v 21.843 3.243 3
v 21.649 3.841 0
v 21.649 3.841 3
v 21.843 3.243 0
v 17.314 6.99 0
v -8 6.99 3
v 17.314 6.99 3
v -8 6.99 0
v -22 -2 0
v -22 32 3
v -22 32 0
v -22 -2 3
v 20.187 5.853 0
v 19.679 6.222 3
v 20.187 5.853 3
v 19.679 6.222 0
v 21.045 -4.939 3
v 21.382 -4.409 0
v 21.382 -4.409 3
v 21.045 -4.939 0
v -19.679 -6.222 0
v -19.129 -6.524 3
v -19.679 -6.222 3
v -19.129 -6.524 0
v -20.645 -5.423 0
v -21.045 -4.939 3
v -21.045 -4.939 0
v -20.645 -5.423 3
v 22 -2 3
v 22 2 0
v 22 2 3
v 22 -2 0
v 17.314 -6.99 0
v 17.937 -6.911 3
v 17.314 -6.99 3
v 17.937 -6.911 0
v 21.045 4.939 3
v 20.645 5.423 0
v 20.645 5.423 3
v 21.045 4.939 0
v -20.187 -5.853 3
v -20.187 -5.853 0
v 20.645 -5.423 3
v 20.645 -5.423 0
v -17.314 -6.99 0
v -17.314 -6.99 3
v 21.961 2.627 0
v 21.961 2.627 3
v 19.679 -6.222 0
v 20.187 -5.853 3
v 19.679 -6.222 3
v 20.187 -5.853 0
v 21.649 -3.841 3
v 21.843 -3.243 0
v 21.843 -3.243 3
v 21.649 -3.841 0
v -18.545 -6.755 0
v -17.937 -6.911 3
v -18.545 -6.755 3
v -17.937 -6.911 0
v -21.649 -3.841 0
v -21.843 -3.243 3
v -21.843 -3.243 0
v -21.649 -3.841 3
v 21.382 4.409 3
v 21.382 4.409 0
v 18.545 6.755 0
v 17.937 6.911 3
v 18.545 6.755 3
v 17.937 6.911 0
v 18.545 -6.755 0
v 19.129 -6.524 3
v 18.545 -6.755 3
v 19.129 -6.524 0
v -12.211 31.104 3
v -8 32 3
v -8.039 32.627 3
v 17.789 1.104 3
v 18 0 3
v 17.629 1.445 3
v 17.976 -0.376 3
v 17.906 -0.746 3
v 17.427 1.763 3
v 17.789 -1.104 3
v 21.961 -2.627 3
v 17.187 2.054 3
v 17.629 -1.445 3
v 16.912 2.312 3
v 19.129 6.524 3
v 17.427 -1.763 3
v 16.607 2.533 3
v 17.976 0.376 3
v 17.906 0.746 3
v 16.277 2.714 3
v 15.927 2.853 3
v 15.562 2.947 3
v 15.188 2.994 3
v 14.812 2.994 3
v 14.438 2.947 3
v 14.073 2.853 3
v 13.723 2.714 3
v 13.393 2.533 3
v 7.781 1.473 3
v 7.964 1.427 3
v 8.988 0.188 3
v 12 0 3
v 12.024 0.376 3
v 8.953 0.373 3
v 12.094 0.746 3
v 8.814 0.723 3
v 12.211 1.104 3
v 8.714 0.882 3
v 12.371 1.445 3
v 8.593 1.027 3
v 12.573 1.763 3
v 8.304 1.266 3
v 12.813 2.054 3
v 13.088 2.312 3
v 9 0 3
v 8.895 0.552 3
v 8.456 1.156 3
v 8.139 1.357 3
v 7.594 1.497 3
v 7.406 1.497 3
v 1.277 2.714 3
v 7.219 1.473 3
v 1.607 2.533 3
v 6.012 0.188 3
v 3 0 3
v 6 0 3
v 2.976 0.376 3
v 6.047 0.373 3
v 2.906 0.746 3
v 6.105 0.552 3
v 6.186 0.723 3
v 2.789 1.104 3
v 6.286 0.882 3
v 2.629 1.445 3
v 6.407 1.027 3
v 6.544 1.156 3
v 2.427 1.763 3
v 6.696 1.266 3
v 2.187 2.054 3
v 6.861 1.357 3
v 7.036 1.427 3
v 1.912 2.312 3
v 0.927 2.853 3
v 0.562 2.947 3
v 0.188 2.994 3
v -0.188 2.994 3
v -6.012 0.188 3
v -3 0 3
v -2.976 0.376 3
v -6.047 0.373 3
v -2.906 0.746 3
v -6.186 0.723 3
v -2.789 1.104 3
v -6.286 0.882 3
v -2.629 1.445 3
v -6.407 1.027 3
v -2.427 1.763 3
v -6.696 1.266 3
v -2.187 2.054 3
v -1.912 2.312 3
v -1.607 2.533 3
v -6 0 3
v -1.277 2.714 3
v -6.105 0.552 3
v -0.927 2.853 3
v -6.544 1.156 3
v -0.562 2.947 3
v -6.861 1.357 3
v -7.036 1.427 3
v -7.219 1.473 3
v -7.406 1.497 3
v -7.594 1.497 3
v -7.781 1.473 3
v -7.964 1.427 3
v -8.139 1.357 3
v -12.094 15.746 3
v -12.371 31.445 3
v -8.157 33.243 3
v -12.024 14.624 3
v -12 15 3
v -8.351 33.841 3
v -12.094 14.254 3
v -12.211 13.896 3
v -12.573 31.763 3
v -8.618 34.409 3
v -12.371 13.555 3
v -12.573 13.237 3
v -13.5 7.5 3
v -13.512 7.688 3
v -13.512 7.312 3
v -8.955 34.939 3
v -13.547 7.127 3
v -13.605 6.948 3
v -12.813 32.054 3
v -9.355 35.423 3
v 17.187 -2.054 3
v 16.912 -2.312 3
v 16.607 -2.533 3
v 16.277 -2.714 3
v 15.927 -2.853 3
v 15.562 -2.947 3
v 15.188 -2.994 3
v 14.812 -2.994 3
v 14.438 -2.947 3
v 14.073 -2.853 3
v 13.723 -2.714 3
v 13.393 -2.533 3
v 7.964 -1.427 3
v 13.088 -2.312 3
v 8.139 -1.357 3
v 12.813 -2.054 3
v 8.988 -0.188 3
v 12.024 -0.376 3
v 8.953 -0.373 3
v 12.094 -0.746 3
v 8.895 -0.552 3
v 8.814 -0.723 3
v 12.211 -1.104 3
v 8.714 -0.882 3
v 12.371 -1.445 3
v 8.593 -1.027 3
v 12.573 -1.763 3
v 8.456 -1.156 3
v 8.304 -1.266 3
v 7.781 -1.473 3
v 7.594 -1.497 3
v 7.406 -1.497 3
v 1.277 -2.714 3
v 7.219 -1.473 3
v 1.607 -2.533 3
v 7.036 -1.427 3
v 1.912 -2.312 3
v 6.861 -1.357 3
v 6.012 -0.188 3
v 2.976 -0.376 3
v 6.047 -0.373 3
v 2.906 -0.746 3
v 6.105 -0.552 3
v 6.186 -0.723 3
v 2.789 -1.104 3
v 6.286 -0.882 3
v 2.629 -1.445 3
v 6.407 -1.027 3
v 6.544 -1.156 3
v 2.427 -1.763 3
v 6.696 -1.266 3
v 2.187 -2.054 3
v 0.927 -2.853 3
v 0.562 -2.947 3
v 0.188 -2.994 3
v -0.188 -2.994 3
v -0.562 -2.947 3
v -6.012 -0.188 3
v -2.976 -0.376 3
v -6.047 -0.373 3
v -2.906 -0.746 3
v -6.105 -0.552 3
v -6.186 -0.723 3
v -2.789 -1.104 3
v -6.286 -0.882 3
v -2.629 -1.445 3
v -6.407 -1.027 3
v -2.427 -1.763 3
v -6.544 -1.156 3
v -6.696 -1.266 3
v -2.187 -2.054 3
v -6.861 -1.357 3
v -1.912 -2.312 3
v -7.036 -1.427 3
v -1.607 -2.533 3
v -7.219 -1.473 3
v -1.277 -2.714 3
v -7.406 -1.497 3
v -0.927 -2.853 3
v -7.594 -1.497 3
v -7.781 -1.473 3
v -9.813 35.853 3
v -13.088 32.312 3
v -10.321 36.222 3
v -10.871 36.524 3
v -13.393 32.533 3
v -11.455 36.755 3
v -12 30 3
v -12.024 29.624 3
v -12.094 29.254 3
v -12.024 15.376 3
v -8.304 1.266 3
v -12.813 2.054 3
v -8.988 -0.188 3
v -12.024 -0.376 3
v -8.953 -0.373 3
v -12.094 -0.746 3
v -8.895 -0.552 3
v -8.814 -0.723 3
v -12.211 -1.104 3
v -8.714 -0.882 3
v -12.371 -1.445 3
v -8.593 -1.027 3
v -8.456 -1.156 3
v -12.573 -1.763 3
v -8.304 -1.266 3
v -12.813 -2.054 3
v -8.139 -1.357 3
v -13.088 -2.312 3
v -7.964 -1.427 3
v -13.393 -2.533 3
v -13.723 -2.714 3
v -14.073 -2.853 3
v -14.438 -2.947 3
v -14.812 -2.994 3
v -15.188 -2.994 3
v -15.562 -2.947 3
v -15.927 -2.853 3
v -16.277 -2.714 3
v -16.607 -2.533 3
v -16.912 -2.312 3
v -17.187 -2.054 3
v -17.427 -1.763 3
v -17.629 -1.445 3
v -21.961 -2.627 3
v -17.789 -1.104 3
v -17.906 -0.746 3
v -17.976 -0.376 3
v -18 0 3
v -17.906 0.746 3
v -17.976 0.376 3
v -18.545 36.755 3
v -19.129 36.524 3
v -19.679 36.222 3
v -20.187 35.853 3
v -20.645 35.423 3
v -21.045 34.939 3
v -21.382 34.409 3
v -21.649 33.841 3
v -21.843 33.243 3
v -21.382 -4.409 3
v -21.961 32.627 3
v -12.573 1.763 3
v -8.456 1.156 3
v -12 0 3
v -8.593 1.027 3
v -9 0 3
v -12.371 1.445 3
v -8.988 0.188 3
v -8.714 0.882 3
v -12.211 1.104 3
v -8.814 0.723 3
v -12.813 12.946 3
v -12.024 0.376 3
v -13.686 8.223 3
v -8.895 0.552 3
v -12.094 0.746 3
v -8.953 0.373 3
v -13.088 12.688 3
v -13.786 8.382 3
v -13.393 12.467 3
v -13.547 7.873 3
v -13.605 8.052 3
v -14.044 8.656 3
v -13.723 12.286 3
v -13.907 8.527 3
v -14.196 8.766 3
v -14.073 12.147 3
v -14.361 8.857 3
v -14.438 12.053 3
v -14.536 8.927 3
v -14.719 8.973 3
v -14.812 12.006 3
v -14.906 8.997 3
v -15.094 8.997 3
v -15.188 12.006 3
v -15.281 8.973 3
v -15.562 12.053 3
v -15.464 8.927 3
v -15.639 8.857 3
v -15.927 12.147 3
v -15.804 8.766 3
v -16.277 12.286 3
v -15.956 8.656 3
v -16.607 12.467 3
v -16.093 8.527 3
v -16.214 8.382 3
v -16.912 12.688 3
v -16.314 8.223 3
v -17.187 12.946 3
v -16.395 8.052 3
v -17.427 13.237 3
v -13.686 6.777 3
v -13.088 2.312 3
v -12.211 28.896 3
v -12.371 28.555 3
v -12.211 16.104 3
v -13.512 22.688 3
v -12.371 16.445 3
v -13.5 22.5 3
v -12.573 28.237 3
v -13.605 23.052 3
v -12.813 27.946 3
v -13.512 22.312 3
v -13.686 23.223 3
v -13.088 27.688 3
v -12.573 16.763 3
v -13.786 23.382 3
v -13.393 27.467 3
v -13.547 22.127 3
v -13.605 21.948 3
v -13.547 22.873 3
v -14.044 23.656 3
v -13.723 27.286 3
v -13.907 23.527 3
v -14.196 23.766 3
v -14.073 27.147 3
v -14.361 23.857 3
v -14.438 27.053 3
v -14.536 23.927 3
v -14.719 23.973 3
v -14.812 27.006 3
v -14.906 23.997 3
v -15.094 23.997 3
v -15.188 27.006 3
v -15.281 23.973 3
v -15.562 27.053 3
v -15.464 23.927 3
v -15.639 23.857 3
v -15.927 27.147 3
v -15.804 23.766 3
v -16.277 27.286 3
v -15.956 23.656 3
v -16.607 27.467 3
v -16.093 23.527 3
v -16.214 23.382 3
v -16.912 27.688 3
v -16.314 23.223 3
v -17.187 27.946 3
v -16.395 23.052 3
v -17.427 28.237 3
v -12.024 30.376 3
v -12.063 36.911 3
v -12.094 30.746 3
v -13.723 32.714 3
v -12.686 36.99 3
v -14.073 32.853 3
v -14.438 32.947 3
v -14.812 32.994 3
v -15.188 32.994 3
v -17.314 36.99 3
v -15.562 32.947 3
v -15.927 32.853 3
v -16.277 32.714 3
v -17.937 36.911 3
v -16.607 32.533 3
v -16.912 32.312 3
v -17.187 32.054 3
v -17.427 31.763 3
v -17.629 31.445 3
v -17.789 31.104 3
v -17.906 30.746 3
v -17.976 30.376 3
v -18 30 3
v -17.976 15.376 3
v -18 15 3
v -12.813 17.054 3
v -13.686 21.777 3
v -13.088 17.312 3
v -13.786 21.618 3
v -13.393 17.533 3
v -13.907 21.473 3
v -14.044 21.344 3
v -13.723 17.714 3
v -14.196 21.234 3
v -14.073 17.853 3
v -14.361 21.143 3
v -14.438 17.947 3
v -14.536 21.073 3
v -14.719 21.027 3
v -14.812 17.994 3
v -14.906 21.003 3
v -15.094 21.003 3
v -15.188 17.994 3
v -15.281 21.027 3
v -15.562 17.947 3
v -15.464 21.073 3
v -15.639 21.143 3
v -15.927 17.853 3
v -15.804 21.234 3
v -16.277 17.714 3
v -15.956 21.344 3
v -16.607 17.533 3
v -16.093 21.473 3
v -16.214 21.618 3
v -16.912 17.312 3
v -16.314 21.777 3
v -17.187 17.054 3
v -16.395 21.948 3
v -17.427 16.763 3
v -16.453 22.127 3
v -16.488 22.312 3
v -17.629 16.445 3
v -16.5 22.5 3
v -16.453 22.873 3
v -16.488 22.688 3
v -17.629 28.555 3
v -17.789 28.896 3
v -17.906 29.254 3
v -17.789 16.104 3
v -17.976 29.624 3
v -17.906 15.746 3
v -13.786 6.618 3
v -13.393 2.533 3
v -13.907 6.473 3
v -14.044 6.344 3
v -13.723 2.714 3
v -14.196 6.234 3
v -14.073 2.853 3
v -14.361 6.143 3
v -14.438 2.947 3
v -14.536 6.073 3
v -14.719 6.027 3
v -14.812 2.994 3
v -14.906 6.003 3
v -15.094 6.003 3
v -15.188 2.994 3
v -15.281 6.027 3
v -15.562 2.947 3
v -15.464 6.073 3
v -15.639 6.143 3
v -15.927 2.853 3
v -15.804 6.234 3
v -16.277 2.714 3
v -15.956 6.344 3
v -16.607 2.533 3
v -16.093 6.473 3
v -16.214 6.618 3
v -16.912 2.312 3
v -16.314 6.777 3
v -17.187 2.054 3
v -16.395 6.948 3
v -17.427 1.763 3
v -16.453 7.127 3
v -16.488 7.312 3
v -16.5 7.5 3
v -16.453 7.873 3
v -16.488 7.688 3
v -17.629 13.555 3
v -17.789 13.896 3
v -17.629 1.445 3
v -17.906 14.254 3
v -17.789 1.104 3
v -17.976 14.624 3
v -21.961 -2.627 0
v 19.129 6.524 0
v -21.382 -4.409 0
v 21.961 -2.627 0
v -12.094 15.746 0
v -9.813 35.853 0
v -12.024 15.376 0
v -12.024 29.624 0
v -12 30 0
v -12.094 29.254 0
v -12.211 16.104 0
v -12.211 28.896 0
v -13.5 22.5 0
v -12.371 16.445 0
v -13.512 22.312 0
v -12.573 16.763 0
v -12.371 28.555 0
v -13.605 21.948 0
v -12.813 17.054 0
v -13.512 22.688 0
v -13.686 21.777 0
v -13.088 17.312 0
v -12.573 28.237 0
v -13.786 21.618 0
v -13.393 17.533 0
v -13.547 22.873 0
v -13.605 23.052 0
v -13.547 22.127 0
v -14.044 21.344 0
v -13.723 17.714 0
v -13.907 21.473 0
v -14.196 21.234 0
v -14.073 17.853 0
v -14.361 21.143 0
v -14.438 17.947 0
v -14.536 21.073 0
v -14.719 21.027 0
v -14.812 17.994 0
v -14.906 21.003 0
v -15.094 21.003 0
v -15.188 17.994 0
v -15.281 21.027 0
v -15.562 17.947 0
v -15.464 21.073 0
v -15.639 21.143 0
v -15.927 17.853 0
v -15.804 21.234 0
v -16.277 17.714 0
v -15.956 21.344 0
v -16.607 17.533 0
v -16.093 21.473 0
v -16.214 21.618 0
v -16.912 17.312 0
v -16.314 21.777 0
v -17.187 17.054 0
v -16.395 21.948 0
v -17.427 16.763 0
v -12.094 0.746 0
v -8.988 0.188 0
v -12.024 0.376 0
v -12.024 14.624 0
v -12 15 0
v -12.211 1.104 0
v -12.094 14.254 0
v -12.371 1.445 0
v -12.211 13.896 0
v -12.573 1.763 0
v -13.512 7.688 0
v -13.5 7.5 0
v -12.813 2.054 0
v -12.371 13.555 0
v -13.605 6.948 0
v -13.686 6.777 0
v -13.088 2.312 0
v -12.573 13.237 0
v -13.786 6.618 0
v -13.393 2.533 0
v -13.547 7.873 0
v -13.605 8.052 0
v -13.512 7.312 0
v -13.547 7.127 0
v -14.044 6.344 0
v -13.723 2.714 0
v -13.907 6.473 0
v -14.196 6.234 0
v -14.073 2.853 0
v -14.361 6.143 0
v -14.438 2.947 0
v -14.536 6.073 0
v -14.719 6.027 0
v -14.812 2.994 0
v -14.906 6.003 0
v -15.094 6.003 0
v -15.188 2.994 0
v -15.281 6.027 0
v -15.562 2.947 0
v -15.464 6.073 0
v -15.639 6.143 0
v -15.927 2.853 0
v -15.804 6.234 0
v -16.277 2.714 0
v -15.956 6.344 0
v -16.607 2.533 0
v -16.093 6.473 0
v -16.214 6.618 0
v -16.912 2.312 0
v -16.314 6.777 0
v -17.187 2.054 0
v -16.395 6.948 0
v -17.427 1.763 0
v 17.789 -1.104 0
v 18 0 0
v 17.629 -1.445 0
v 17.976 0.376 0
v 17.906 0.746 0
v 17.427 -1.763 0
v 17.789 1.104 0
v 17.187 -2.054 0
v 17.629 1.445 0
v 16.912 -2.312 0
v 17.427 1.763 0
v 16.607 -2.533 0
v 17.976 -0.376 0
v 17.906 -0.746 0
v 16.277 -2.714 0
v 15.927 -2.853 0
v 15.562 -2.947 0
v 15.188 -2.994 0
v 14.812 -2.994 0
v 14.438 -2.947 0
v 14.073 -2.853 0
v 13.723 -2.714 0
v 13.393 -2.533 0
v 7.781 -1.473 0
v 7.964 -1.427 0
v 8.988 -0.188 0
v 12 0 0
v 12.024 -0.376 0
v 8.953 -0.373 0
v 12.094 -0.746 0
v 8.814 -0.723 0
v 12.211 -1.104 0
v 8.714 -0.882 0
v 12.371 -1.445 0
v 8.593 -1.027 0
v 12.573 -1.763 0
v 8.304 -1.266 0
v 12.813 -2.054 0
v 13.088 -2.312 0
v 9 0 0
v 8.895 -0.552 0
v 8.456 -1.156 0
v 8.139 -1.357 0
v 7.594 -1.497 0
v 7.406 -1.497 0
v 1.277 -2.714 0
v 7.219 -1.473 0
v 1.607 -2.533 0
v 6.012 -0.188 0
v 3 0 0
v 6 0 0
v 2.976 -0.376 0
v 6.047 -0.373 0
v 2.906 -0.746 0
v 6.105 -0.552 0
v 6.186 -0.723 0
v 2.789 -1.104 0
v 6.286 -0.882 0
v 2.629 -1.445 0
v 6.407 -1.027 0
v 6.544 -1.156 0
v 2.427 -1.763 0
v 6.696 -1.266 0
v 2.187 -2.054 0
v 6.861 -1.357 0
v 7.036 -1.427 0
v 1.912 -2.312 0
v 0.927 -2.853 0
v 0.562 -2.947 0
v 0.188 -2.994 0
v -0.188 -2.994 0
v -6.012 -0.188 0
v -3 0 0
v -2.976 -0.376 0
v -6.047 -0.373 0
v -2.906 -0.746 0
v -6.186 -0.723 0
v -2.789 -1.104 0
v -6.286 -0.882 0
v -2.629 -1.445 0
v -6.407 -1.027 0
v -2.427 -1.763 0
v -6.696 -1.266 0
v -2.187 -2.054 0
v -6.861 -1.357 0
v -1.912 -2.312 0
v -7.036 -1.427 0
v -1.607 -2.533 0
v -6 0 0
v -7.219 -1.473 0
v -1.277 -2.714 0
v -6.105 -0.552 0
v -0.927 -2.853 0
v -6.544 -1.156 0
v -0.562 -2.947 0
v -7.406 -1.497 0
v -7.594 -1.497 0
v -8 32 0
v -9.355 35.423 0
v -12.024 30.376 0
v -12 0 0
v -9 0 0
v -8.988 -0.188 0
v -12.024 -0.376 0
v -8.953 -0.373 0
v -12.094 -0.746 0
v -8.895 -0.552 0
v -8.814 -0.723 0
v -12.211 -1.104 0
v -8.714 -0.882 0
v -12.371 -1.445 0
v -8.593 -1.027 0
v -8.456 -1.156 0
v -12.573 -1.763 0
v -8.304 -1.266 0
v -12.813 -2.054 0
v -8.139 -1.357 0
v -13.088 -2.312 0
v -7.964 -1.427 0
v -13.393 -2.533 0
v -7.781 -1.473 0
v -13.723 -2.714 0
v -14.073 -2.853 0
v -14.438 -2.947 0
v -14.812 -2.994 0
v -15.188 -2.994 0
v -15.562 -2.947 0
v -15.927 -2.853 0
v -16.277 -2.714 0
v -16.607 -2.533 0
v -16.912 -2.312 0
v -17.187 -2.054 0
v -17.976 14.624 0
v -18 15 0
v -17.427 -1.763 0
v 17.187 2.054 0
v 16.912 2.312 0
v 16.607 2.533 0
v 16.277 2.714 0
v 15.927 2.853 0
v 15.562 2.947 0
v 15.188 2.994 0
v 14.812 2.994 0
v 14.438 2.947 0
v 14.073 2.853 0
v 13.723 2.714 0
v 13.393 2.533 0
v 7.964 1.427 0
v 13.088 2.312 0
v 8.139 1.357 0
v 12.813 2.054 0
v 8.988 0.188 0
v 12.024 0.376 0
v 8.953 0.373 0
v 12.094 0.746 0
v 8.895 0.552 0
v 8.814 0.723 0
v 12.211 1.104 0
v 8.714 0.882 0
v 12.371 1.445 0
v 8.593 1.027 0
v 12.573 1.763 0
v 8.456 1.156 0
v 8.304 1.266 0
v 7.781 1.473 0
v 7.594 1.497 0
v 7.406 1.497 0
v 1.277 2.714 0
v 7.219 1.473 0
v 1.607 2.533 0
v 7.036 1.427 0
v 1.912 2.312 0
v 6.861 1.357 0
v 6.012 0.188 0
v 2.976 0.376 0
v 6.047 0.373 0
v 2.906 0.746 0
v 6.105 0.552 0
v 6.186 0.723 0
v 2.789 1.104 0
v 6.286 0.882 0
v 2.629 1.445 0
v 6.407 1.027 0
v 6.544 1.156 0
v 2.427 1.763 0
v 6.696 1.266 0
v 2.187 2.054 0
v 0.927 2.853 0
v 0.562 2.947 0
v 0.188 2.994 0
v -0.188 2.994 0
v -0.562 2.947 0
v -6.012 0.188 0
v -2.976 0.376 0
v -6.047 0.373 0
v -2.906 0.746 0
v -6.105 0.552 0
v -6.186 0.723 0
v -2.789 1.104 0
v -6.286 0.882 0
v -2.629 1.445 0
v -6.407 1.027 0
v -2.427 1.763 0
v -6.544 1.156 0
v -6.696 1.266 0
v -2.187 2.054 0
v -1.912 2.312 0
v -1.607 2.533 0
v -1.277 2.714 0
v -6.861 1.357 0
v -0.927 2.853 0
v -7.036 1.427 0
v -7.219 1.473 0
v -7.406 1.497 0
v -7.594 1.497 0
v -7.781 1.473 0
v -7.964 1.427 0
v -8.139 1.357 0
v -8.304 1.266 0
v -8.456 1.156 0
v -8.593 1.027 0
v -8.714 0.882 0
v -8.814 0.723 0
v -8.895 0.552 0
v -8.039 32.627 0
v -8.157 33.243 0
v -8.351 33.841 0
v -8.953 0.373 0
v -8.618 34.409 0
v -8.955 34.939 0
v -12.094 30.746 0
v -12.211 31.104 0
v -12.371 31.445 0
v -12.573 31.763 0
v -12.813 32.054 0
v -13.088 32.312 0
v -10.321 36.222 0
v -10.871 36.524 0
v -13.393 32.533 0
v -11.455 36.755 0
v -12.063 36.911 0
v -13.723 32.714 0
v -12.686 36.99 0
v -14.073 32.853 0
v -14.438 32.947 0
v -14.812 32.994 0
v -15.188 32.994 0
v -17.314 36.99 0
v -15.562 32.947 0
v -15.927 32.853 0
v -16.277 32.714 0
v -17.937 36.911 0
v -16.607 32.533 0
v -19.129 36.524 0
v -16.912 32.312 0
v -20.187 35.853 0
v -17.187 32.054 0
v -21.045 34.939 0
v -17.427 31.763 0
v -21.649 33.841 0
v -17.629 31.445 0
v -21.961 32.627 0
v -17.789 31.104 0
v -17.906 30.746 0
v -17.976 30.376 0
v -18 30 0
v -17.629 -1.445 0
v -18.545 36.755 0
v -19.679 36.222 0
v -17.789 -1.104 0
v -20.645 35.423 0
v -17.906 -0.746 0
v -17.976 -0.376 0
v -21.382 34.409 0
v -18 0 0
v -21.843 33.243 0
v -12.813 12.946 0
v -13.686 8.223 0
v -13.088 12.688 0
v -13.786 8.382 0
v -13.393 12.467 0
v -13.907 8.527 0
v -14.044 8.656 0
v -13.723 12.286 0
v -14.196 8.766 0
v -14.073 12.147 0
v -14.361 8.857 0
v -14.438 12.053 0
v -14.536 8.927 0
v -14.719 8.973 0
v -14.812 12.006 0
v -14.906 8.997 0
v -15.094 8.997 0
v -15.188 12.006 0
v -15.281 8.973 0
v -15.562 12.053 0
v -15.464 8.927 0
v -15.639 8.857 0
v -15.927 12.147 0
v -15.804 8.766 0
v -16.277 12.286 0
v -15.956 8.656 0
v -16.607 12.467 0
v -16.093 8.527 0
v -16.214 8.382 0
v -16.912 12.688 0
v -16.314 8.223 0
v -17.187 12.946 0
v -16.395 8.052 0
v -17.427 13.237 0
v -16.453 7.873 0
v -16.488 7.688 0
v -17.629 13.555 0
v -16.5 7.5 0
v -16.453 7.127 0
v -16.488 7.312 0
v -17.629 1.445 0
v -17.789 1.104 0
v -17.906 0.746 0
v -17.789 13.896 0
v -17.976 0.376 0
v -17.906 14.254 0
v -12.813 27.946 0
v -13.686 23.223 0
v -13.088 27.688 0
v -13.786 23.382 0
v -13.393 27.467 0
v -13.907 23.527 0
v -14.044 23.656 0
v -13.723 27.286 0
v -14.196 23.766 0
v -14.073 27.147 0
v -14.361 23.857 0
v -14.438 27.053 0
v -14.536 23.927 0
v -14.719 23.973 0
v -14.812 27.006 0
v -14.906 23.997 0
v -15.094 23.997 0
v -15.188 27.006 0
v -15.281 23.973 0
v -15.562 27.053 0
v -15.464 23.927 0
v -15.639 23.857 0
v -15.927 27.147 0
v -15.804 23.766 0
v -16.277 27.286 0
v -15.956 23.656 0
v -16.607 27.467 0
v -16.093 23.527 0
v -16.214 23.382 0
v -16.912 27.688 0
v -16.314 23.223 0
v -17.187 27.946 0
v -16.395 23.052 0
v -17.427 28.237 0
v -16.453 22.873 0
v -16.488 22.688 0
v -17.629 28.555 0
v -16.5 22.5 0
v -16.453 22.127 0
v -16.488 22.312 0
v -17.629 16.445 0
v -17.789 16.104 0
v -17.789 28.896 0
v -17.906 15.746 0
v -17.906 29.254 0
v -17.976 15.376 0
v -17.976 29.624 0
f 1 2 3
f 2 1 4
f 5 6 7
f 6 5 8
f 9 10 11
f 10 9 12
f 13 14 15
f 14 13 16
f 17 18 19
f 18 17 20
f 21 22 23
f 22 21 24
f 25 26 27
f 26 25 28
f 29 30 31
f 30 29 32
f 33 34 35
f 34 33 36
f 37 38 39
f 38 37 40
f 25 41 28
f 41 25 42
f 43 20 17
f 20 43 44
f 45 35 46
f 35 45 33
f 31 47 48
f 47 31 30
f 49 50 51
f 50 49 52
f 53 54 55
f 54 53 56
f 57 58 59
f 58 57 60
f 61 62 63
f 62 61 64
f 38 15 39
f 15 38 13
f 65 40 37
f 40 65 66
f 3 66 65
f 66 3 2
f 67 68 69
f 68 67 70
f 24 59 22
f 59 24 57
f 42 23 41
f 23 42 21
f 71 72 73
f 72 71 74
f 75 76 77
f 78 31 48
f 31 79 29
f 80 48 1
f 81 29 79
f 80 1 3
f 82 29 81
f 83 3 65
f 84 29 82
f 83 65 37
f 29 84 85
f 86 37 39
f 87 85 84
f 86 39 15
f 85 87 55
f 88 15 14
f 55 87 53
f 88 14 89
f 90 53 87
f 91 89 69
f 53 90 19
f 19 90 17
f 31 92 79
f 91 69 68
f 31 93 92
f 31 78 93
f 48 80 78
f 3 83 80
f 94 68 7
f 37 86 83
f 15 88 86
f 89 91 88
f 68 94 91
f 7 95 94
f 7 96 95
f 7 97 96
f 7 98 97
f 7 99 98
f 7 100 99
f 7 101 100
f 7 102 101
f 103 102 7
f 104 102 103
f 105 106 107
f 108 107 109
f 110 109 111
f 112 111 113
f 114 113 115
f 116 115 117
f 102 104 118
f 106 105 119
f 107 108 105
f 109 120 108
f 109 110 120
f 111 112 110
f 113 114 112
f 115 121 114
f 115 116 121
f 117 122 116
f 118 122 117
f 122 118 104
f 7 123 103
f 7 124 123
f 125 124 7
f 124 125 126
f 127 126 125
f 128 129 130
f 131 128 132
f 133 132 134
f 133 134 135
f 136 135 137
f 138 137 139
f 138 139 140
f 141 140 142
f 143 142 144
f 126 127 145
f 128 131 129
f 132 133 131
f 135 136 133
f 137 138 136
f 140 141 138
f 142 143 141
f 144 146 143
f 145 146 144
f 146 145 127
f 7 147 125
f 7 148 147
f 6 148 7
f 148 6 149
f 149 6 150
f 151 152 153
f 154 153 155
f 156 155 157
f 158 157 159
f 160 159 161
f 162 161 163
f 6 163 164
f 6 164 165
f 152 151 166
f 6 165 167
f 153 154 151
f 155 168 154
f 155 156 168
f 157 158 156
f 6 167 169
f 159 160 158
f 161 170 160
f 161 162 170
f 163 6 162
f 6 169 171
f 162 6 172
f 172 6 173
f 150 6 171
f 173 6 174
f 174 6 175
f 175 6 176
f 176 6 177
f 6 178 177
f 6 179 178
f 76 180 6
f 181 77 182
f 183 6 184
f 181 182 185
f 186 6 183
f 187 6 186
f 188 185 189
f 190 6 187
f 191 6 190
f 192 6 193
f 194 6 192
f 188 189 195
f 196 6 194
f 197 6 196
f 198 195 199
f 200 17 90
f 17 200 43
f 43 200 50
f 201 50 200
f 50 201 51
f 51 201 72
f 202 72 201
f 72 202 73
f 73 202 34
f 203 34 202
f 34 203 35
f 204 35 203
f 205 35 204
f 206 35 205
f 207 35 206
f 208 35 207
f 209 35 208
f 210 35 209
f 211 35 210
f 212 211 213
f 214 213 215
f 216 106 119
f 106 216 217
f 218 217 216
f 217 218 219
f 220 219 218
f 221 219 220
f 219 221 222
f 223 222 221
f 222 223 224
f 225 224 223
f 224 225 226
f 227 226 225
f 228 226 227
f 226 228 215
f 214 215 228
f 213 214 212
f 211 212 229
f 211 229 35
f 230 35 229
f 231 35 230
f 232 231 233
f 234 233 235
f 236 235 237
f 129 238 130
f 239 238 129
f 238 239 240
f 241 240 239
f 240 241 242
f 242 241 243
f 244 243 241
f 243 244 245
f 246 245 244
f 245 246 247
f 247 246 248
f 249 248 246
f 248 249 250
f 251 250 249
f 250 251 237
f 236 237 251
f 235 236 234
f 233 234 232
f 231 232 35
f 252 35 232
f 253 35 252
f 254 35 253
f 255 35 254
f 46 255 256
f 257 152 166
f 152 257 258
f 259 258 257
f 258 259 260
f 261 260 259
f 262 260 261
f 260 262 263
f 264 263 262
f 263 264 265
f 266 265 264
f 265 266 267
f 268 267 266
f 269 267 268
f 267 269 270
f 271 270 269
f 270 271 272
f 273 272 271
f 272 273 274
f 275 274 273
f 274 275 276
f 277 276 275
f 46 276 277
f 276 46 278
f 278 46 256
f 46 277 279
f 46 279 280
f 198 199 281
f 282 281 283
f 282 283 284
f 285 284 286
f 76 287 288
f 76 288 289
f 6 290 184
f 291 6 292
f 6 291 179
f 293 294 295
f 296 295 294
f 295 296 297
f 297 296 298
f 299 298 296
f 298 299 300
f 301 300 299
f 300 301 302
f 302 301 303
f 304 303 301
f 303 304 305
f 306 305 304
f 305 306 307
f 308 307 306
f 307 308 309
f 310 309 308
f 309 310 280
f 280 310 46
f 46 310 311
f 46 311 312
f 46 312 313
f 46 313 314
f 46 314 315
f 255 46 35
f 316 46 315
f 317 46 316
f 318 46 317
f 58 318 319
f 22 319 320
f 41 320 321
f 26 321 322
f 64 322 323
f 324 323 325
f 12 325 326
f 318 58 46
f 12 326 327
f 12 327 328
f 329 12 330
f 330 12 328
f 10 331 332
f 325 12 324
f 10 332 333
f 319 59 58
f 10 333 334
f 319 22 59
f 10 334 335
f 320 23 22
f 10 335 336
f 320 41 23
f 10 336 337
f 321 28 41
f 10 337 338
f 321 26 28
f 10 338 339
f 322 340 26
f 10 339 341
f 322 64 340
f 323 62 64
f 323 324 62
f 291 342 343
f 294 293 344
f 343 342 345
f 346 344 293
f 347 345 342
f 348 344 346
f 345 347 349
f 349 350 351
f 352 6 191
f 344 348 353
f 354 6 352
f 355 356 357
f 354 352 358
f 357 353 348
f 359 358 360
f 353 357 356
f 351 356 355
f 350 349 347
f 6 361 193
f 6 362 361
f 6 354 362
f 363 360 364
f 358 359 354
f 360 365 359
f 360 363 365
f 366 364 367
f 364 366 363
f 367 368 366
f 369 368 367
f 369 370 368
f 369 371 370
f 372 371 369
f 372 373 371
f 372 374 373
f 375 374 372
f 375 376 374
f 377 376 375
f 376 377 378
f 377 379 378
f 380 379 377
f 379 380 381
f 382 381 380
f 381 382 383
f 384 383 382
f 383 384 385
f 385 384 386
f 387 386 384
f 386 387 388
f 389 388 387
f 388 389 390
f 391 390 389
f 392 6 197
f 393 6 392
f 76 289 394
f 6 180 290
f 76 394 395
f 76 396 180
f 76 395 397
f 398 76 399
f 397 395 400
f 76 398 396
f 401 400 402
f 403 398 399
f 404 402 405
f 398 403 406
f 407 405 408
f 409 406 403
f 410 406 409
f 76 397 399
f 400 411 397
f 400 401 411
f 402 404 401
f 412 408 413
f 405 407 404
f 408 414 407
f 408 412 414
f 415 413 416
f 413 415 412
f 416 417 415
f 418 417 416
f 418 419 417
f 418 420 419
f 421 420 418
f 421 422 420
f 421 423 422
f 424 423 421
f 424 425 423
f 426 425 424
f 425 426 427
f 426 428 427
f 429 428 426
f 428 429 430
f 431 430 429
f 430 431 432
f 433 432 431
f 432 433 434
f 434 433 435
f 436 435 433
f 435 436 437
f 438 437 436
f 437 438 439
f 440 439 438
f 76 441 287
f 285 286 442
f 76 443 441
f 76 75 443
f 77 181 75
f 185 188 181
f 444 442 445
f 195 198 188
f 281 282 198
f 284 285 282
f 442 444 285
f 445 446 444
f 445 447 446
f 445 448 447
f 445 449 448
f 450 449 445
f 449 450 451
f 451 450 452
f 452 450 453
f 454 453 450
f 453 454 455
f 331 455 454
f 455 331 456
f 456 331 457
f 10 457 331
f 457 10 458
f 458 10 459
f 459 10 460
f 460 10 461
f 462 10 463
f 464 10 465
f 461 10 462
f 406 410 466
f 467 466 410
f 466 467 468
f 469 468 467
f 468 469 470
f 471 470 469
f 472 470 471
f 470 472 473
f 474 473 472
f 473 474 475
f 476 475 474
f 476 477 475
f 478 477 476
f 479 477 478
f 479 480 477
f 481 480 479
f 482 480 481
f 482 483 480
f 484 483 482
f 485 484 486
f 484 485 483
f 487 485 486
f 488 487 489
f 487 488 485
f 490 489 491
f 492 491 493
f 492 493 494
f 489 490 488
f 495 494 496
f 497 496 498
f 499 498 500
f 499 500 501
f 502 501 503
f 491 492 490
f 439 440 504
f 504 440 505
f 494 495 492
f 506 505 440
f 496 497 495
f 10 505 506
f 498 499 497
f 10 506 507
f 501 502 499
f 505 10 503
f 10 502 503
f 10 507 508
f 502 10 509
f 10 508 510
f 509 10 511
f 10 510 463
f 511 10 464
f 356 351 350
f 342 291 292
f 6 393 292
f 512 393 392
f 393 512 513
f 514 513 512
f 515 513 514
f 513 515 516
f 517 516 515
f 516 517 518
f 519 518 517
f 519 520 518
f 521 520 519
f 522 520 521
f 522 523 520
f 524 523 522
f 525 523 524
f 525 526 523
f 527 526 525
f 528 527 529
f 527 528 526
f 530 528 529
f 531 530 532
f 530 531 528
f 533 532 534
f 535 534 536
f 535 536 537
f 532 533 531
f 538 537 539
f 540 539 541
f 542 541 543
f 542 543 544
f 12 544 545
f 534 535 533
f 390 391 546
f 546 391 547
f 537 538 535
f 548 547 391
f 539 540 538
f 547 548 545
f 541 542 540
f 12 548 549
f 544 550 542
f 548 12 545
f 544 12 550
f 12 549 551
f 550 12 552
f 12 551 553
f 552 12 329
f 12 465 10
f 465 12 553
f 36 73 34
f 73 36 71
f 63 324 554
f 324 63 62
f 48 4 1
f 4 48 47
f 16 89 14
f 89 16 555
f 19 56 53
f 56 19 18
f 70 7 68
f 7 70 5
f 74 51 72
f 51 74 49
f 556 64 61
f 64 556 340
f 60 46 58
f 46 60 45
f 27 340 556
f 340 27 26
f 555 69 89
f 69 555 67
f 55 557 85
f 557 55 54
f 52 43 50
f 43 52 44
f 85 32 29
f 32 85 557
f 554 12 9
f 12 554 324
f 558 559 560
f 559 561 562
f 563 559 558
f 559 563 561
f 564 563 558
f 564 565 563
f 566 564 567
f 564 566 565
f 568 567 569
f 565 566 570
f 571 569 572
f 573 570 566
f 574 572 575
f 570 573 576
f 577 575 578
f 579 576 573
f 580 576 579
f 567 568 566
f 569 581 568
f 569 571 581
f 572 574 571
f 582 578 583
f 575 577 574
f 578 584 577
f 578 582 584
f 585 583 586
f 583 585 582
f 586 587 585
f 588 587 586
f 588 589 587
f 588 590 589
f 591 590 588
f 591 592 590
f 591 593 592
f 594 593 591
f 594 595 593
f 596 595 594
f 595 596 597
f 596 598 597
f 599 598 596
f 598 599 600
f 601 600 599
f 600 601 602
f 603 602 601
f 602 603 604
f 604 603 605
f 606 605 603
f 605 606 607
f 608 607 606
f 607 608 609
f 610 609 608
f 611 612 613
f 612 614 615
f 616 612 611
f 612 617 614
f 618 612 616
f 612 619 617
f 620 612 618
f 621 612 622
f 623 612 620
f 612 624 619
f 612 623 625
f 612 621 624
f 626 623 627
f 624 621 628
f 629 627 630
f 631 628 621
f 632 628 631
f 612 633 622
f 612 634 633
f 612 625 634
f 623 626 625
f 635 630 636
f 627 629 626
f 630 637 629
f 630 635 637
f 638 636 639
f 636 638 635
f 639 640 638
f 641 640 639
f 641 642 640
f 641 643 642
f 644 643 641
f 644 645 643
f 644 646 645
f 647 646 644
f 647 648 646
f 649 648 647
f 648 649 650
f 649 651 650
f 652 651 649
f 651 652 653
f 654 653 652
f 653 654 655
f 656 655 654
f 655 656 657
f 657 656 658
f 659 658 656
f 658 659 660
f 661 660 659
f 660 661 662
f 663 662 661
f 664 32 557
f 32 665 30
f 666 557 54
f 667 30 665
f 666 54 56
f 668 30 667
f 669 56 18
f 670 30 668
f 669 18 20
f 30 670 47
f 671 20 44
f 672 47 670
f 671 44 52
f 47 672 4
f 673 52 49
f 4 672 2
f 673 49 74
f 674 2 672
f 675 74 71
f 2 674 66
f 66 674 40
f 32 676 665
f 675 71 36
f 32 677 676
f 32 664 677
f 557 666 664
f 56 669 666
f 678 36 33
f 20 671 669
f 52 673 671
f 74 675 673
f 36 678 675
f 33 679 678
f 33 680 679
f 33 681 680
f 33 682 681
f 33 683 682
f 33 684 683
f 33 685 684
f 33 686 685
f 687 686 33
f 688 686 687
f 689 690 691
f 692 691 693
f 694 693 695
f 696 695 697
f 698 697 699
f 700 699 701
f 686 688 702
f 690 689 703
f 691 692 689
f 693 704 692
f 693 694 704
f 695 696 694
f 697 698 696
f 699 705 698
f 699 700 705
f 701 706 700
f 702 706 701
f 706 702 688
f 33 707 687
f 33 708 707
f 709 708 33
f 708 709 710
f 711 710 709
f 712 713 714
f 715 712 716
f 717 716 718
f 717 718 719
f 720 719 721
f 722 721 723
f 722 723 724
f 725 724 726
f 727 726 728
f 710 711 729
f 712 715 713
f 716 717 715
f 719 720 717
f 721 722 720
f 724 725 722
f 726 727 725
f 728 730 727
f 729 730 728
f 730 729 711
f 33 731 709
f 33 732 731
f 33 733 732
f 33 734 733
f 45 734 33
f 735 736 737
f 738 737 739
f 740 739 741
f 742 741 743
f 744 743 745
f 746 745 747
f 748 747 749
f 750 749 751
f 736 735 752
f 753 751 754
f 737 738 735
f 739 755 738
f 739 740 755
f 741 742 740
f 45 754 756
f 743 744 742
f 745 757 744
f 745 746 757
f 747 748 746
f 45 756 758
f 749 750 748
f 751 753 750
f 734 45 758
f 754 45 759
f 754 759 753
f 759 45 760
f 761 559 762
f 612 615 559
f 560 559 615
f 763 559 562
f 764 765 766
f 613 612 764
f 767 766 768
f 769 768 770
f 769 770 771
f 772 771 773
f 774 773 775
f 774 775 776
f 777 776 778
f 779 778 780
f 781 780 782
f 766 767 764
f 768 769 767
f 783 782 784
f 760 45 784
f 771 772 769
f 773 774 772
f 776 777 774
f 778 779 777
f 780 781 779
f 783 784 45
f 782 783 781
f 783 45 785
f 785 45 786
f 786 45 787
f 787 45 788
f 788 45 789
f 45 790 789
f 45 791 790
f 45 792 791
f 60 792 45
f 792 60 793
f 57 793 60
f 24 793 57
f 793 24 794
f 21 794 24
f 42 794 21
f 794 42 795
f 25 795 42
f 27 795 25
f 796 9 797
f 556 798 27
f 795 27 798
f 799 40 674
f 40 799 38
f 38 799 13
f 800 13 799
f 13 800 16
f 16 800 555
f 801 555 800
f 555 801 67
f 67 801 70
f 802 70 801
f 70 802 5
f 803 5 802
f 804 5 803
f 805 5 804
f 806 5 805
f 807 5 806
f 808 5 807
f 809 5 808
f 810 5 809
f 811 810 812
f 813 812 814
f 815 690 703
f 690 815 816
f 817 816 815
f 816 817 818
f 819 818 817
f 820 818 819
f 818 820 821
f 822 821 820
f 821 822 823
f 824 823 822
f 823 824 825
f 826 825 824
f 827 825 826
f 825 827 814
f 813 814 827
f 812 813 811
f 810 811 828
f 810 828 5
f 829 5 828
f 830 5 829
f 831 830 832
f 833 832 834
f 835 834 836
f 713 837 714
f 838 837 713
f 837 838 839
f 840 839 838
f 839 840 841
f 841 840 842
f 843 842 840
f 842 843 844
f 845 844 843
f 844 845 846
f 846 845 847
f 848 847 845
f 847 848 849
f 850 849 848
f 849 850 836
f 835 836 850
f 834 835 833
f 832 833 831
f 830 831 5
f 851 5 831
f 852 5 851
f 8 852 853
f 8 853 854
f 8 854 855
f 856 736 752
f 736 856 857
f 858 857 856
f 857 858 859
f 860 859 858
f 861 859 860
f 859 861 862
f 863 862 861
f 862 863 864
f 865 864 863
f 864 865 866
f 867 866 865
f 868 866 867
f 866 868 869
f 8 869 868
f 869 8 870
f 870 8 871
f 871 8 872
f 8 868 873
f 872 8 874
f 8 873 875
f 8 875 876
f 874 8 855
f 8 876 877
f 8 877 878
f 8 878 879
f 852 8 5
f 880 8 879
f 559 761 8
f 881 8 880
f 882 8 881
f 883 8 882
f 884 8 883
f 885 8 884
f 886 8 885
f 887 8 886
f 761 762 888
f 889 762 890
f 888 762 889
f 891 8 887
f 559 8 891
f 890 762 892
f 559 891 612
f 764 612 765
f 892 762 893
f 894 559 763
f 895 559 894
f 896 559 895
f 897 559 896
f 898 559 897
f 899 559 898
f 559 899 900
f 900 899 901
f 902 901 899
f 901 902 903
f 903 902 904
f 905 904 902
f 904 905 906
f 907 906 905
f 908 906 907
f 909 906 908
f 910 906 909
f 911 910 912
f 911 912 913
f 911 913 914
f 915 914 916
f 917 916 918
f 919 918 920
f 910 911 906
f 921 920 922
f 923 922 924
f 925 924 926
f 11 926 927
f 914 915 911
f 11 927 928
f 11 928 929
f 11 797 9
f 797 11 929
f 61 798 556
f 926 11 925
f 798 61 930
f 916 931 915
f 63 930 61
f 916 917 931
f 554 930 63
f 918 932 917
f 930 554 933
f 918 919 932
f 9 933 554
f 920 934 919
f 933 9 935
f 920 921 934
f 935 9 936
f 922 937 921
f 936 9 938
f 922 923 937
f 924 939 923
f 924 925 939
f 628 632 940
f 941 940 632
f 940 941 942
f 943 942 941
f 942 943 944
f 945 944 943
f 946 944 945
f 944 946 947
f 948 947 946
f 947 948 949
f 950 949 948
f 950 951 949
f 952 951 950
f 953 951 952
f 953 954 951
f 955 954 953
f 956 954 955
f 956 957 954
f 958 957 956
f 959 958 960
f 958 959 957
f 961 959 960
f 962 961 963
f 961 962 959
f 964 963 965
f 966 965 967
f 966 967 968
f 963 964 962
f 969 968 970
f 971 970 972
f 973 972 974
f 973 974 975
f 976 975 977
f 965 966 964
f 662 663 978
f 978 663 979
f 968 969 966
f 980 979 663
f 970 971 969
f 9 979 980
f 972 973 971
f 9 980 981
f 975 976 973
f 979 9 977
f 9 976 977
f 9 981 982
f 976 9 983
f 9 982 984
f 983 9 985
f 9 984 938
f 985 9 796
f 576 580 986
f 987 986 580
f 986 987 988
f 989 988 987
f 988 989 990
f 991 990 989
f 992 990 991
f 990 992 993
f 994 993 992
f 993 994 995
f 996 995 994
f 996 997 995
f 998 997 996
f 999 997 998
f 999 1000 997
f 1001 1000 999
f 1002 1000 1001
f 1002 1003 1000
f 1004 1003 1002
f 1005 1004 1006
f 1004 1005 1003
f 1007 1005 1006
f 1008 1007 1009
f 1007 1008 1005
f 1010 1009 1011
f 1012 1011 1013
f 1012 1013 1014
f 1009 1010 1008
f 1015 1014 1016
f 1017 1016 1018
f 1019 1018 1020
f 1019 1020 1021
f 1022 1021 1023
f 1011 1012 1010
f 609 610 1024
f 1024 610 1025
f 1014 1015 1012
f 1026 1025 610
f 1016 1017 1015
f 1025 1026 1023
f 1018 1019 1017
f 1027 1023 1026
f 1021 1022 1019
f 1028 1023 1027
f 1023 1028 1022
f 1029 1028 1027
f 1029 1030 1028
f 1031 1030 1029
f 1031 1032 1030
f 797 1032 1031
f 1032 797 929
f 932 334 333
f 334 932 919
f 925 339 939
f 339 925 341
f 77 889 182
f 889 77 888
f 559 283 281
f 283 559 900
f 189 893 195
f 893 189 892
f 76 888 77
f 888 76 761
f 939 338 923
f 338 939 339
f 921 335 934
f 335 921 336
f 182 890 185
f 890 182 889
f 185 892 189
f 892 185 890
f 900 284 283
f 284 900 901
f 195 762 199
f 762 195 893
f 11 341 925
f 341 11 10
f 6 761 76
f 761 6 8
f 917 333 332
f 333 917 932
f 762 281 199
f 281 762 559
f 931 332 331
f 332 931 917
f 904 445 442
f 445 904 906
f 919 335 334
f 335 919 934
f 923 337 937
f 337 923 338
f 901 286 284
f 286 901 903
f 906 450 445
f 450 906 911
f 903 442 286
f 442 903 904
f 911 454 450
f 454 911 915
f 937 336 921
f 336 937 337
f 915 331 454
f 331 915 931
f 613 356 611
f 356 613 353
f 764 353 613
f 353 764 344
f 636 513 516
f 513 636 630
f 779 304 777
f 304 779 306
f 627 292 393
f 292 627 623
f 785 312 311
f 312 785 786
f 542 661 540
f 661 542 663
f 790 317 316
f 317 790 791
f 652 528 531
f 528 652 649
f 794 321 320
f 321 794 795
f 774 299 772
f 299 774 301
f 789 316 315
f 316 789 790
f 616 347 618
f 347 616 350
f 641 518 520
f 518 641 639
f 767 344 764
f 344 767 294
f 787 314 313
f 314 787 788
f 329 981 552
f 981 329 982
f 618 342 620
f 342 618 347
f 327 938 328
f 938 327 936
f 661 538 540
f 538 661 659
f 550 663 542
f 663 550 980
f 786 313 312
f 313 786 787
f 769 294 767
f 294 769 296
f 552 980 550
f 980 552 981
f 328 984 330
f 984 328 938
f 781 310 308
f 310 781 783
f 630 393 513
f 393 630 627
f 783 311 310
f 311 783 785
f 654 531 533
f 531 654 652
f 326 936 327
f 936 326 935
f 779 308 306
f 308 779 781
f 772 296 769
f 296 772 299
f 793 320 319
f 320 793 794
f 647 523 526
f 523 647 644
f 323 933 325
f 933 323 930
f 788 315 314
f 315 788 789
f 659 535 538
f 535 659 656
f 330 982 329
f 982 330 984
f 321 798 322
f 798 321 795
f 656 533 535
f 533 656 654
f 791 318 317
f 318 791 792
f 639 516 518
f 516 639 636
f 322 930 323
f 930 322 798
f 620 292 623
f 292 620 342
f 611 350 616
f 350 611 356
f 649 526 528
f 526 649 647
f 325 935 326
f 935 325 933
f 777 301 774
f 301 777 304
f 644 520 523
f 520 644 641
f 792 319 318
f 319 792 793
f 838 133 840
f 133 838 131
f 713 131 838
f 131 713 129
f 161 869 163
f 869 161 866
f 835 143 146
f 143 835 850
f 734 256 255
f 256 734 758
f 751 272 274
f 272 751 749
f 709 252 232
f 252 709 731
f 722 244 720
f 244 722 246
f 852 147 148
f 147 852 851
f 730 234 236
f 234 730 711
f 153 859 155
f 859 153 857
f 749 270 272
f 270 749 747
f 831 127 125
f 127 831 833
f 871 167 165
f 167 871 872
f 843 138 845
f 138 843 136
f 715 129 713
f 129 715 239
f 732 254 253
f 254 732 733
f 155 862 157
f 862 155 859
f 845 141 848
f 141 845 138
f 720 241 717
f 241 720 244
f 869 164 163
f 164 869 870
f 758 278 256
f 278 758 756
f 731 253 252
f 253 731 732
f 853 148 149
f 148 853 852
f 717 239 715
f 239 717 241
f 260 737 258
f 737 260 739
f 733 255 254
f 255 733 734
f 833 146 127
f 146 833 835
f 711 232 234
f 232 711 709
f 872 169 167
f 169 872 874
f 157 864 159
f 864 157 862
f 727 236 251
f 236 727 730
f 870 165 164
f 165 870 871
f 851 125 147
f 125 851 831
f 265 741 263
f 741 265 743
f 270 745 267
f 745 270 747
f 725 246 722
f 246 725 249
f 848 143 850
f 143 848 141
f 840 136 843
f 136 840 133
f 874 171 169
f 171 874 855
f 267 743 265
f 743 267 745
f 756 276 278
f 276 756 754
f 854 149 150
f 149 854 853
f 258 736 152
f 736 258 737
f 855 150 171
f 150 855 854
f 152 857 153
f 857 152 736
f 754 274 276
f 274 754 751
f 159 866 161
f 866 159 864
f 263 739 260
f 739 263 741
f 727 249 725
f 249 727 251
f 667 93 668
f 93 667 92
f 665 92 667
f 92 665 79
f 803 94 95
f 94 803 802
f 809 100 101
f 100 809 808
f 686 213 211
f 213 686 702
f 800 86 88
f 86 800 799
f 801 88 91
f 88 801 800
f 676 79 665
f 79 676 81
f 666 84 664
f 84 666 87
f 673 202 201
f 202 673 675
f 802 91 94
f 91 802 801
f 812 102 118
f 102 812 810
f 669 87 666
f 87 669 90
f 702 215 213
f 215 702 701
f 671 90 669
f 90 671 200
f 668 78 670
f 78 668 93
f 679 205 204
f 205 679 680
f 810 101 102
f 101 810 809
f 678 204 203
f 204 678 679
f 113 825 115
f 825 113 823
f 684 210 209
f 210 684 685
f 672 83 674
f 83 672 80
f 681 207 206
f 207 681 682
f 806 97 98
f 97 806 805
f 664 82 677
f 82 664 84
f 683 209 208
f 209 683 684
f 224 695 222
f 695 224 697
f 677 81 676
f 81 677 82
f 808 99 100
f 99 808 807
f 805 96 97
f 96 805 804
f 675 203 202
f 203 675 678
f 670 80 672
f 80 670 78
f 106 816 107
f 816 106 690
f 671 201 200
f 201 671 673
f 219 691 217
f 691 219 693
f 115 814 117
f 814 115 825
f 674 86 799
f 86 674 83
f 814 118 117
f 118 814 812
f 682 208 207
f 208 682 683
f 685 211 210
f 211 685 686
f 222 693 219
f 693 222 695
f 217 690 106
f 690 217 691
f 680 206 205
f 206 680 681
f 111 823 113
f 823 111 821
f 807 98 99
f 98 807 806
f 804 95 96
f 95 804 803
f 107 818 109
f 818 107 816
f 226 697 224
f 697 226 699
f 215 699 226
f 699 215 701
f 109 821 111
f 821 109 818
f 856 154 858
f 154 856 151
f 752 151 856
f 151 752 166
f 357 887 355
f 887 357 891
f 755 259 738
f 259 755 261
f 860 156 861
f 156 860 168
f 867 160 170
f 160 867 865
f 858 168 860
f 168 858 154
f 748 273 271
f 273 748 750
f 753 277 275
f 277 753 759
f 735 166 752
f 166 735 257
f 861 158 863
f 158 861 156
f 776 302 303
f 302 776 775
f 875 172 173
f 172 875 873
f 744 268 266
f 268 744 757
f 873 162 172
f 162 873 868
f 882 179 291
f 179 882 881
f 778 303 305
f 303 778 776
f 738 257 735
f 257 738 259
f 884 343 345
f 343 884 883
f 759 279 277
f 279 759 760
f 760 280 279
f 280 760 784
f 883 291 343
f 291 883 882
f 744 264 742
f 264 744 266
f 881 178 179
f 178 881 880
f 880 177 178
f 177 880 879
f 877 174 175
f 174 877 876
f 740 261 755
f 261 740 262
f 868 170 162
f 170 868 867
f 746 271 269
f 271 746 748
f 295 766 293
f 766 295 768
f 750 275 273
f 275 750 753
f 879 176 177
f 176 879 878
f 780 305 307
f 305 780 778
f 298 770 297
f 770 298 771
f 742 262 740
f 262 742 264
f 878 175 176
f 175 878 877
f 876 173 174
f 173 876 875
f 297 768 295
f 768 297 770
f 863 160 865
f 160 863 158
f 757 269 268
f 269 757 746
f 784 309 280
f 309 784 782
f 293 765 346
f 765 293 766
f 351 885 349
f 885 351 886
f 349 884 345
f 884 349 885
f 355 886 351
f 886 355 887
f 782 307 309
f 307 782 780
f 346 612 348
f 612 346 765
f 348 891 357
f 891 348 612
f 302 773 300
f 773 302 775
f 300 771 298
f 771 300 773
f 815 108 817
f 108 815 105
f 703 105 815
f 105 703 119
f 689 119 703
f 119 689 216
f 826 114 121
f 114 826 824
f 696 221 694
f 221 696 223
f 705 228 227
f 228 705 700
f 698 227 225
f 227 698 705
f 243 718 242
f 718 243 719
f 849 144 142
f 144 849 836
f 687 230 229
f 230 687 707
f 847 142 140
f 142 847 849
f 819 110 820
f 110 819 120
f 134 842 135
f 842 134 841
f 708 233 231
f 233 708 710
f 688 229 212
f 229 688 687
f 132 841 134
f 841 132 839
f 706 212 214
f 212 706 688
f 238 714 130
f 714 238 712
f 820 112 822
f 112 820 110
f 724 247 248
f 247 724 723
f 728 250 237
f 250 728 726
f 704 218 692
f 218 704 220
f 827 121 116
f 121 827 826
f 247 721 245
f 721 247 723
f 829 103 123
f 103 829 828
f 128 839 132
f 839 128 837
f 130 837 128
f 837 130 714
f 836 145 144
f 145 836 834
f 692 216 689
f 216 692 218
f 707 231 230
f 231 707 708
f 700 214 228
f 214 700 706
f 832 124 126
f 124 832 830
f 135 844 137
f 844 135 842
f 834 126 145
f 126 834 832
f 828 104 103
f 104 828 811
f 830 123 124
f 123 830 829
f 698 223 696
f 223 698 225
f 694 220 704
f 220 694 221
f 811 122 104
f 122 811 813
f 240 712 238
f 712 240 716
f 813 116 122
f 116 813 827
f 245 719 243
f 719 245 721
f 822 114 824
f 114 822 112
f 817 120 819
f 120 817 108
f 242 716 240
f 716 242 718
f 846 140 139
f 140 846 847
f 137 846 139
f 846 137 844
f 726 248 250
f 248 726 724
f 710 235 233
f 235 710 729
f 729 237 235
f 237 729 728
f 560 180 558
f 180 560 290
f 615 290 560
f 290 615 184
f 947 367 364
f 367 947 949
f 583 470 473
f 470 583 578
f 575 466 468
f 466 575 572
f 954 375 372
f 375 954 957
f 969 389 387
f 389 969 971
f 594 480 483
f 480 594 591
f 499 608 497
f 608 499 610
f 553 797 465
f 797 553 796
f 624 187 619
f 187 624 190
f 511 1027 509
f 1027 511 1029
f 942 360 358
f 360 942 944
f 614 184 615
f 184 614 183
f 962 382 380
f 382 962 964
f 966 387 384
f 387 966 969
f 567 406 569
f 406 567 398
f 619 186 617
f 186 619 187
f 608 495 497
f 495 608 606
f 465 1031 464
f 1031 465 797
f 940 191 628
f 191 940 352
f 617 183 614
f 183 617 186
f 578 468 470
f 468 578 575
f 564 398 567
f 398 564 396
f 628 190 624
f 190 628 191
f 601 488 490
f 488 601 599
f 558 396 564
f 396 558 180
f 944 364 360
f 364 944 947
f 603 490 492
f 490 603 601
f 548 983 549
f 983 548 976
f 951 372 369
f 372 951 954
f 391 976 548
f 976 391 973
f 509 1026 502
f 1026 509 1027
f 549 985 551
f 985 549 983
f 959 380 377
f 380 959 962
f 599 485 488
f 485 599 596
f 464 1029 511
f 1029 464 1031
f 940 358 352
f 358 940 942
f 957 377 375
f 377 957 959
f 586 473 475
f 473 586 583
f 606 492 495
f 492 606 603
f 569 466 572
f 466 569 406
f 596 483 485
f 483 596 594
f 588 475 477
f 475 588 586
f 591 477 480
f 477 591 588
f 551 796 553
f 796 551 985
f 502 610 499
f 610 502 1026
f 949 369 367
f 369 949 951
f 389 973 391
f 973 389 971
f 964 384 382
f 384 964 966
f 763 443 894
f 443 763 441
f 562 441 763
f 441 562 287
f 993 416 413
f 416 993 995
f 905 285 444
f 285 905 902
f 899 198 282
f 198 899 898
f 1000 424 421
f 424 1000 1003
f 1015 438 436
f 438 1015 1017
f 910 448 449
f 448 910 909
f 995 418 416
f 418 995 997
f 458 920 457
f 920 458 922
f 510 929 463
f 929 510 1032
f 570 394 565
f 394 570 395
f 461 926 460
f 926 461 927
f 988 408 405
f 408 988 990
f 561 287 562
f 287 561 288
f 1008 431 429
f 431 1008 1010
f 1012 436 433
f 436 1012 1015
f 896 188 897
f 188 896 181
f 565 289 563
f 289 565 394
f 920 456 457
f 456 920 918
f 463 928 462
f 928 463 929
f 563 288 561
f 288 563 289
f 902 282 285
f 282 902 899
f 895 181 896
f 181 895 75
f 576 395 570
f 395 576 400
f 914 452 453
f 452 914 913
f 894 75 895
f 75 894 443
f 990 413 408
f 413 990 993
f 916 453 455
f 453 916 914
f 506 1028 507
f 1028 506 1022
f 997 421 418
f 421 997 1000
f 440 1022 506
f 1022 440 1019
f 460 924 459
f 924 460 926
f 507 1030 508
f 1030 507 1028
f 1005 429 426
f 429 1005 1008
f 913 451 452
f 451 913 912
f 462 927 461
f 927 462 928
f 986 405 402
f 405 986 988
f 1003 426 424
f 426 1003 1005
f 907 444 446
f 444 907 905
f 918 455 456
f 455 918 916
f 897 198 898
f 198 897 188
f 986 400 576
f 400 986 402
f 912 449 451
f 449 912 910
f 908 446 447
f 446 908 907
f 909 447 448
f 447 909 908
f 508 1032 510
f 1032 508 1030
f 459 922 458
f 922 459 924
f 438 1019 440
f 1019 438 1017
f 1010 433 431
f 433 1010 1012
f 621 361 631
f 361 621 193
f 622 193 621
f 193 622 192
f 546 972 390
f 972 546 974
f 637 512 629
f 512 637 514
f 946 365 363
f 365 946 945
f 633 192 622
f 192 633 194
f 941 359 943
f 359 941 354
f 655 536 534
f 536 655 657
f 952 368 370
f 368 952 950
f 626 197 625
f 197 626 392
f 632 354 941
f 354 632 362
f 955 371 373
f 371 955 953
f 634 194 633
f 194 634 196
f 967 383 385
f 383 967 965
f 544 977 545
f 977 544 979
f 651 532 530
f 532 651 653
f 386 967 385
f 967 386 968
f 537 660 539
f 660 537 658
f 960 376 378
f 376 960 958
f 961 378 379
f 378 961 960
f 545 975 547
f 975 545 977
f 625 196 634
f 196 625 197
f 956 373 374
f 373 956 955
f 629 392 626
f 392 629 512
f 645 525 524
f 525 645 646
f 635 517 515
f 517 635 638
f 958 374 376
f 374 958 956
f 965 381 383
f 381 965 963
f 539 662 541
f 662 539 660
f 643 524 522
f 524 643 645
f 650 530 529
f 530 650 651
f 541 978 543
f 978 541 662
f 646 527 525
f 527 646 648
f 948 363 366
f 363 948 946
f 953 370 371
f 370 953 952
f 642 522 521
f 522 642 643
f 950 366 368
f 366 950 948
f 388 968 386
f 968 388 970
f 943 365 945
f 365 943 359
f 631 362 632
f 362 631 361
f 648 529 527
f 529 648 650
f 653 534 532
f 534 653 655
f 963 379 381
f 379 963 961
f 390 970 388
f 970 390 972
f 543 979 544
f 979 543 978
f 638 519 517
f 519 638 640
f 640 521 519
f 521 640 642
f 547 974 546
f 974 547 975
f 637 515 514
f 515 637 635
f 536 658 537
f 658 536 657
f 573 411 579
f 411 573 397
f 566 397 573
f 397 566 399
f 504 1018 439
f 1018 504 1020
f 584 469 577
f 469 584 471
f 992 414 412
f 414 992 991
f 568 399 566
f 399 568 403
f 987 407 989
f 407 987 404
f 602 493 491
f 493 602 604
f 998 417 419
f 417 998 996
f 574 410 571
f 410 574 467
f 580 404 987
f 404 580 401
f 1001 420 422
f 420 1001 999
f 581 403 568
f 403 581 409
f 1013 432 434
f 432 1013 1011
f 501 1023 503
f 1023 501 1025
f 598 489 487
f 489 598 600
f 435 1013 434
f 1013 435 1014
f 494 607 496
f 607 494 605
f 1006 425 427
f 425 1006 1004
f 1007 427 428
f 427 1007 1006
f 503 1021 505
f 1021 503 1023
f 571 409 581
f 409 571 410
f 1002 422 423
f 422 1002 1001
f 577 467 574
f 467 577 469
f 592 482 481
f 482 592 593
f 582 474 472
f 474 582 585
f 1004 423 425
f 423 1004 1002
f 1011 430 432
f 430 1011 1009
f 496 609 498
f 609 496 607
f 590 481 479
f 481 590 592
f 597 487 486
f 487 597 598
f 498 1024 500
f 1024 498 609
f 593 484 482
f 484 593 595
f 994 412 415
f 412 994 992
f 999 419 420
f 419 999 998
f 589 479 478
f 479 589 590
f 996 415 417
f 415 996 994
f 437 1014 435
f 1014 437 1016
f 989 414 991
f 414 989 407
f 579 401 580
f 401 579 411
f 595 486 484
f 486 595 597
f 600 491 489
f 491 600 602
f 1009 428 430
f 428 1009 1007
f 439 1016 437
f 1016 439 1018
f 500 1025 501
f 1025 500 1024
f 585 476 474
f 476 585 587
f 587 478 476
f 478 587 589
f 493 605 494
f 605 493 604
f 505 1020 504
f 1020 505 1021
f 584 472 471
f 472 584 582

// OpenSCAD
$fn = 50;


difference() {
	union() {
		*color(alpha = 1.0000000000, c = "gray") {
			translate(v = [0, 7, 0]) {
				linear_extrude(height = 1) {
					text(font = "Arial:style=Bold", halign = "center", size = 4.5000000000, text = "COMMENT plate main", valign = "center");
				}
			}
		}
		hull() {
			translate(v = [-17.0000000000, 2.0000000000, 0]) {
				cylinder(h = 3, r = 5);
			}
			translate(v = [17.0000000000, 2.0000000000, 0]) {
				cylinder(h = 3, r = 5);
			}
			translate(v = [-17.0000000000, -2.0000000000, 0]) {
				cylinder(h = 3, r = 5);
			}
			translate(v = [17.0000000000, -2.0000000000, 0]) {
				cylinder(h = 3, r = 5);
			}
		}
		*color(alpha = 1.0000000000, c = "gray") {
			translate(v = [0, 7, 0]) {
				linear_extrude(height = 1) {
					text(font = "Arial:style=Bold", halign = "center", size = 4.5000000000, text = "COMMENT plate main", valign = "center");
				}
			}
		}
		translate(v = [-15.0000000000, 15.0000000000, 0]) {
			hull() {
				translate(v = [-2.0000000000, 17.0000000000, 0]) {
					cylinder(h = 3, r = 5);
				}
				translate(v = [2.0000000000, 17.0000000000, 0]) {
					cylinder(h = 3, r = 5);
				}
				translate(v = [-2.0000000000, -17.0000000000, 0]) {
					cylinder(h = 3, r = 5);
				}
				translate(v = [2.0000000000, -17.0000000000, 0]) {
					cylinder(h = 3, r = 5);
				}
			}
		}
	}
	union() {
		*color(alpha = 1.0000000000, c = "gray") {
			translate(v = [0, 7, 0]) {
				linear_extrude(height = 1) {
					text(font = "Arial:style=Bold", halign = "center", size = 4.5000000000, text = "COMMENT holes main", valign = "center");
				}
			}
		}
		translate(v = [-15.0000000000, 0.0000000000, 0]) {
			translate(v = [0, 0, -100]) {
				cylinder(h = 200, r = 3.0000000000);
			}
		}
		translate(v = [0, 0, -100]) {
			cylinder(h = 200, r = 3.0000000000);
		}
		translate(v = [15.0000000000, 0.0000000000, 0]) {
			translate(v = [0, 0, -100]) {
				cylinder(h = 200, r = 3.0000000000);
			}
		}
		translate(v = [-15.0000000000, 0.0000000000, 0]) {
			translate(v = [0, 0, -100]) {
				cylinder(h = 200, r = 1.5000000000);
			}
		}
		translate(v = [-7.5000000000, 0.0000000000, 0]) {
			translate(v = [0, 0, -100]) {
				cylinder(h = 200, r = 1.5000000000);
			}
		}
		translate(v = [0, 0, -100]) {
			cylinder(h = 200, r = 1.5000000000);
		}
		translate(v = [7.5000000000, 0.0000000000, 0]) {
			translate(v = [0, 0, -100]) {
				cylinder(h = 200, r = 1.5000000000);
			}
		}
		translate(v = [15.0000000000, 0.0000000000, 0]) {
			translate(v = [0, 0, -100]) {
				cylinder(h = 200, r = 1.5000000000);
			}
		}
		*color(alpha = 1.0000000000, c = "gray") {
			translate(v = [0, 7, 0]) {
				linear_extrude(height = 1) {
					text(font = "Arial:style=Bold", halign = "center", size = 4.5000000000, text = "COMMENT holes main", valign = "center");
				}
			}
		}
		translate(v = [-15.0000000000, 0.0000000000, 0]) {
			translate(v = [0, 0, -100]) {
				cylinder(h = 200, r = 3.0000000000);
			}
		}
		translate(v = [-15.0000000000, 15.0000000000, 0]) {
			translate(v = [0, 0, -100]) {
				cylinder(h = 200, r = 3.0000000000);
			}
		}
		translate(v = [-15.0000000000, 30.0000000000, 0]) {
			translate(v = [0, 0, -100]) {
				cylinder(h = 200, r = 3.0000000000);
			}
		}
		translate(v = [-15.0000000000, 0.0000000000, 0]) {
			translate(v = [0, 0, -100]) {
				cylinder(h = 200, r = 1.5000000000);
			}
		}
		translate(v = [-15.0000000000, 7.5000000000, 0]) {
			translate(v = [0, 0, -100]) {
				cylinder(h = 200, r = 1.5000000000);
			}
		}
		translate(v = [-15.0000000000, 15.0000000000, 0]) {
			translate(v = [0, 0, -100]) {
				cylinder(h = 200, r = 1.5000000000);
			}
		}
		translate(v = [-15.0000000000, 22.5000000000, 0]) {
			translate(v = [0, 0, -100]) {
				cylinder(h = 200, r = 1.5000000000);
			}
		}
		translate(v = [-15.0000000000, 30.0000000000, 0]) {
			translate(v = [0, 0, -100]) {
				cylinder(h = 200, r = 1.5000000000);
			}
		}
	}
}
